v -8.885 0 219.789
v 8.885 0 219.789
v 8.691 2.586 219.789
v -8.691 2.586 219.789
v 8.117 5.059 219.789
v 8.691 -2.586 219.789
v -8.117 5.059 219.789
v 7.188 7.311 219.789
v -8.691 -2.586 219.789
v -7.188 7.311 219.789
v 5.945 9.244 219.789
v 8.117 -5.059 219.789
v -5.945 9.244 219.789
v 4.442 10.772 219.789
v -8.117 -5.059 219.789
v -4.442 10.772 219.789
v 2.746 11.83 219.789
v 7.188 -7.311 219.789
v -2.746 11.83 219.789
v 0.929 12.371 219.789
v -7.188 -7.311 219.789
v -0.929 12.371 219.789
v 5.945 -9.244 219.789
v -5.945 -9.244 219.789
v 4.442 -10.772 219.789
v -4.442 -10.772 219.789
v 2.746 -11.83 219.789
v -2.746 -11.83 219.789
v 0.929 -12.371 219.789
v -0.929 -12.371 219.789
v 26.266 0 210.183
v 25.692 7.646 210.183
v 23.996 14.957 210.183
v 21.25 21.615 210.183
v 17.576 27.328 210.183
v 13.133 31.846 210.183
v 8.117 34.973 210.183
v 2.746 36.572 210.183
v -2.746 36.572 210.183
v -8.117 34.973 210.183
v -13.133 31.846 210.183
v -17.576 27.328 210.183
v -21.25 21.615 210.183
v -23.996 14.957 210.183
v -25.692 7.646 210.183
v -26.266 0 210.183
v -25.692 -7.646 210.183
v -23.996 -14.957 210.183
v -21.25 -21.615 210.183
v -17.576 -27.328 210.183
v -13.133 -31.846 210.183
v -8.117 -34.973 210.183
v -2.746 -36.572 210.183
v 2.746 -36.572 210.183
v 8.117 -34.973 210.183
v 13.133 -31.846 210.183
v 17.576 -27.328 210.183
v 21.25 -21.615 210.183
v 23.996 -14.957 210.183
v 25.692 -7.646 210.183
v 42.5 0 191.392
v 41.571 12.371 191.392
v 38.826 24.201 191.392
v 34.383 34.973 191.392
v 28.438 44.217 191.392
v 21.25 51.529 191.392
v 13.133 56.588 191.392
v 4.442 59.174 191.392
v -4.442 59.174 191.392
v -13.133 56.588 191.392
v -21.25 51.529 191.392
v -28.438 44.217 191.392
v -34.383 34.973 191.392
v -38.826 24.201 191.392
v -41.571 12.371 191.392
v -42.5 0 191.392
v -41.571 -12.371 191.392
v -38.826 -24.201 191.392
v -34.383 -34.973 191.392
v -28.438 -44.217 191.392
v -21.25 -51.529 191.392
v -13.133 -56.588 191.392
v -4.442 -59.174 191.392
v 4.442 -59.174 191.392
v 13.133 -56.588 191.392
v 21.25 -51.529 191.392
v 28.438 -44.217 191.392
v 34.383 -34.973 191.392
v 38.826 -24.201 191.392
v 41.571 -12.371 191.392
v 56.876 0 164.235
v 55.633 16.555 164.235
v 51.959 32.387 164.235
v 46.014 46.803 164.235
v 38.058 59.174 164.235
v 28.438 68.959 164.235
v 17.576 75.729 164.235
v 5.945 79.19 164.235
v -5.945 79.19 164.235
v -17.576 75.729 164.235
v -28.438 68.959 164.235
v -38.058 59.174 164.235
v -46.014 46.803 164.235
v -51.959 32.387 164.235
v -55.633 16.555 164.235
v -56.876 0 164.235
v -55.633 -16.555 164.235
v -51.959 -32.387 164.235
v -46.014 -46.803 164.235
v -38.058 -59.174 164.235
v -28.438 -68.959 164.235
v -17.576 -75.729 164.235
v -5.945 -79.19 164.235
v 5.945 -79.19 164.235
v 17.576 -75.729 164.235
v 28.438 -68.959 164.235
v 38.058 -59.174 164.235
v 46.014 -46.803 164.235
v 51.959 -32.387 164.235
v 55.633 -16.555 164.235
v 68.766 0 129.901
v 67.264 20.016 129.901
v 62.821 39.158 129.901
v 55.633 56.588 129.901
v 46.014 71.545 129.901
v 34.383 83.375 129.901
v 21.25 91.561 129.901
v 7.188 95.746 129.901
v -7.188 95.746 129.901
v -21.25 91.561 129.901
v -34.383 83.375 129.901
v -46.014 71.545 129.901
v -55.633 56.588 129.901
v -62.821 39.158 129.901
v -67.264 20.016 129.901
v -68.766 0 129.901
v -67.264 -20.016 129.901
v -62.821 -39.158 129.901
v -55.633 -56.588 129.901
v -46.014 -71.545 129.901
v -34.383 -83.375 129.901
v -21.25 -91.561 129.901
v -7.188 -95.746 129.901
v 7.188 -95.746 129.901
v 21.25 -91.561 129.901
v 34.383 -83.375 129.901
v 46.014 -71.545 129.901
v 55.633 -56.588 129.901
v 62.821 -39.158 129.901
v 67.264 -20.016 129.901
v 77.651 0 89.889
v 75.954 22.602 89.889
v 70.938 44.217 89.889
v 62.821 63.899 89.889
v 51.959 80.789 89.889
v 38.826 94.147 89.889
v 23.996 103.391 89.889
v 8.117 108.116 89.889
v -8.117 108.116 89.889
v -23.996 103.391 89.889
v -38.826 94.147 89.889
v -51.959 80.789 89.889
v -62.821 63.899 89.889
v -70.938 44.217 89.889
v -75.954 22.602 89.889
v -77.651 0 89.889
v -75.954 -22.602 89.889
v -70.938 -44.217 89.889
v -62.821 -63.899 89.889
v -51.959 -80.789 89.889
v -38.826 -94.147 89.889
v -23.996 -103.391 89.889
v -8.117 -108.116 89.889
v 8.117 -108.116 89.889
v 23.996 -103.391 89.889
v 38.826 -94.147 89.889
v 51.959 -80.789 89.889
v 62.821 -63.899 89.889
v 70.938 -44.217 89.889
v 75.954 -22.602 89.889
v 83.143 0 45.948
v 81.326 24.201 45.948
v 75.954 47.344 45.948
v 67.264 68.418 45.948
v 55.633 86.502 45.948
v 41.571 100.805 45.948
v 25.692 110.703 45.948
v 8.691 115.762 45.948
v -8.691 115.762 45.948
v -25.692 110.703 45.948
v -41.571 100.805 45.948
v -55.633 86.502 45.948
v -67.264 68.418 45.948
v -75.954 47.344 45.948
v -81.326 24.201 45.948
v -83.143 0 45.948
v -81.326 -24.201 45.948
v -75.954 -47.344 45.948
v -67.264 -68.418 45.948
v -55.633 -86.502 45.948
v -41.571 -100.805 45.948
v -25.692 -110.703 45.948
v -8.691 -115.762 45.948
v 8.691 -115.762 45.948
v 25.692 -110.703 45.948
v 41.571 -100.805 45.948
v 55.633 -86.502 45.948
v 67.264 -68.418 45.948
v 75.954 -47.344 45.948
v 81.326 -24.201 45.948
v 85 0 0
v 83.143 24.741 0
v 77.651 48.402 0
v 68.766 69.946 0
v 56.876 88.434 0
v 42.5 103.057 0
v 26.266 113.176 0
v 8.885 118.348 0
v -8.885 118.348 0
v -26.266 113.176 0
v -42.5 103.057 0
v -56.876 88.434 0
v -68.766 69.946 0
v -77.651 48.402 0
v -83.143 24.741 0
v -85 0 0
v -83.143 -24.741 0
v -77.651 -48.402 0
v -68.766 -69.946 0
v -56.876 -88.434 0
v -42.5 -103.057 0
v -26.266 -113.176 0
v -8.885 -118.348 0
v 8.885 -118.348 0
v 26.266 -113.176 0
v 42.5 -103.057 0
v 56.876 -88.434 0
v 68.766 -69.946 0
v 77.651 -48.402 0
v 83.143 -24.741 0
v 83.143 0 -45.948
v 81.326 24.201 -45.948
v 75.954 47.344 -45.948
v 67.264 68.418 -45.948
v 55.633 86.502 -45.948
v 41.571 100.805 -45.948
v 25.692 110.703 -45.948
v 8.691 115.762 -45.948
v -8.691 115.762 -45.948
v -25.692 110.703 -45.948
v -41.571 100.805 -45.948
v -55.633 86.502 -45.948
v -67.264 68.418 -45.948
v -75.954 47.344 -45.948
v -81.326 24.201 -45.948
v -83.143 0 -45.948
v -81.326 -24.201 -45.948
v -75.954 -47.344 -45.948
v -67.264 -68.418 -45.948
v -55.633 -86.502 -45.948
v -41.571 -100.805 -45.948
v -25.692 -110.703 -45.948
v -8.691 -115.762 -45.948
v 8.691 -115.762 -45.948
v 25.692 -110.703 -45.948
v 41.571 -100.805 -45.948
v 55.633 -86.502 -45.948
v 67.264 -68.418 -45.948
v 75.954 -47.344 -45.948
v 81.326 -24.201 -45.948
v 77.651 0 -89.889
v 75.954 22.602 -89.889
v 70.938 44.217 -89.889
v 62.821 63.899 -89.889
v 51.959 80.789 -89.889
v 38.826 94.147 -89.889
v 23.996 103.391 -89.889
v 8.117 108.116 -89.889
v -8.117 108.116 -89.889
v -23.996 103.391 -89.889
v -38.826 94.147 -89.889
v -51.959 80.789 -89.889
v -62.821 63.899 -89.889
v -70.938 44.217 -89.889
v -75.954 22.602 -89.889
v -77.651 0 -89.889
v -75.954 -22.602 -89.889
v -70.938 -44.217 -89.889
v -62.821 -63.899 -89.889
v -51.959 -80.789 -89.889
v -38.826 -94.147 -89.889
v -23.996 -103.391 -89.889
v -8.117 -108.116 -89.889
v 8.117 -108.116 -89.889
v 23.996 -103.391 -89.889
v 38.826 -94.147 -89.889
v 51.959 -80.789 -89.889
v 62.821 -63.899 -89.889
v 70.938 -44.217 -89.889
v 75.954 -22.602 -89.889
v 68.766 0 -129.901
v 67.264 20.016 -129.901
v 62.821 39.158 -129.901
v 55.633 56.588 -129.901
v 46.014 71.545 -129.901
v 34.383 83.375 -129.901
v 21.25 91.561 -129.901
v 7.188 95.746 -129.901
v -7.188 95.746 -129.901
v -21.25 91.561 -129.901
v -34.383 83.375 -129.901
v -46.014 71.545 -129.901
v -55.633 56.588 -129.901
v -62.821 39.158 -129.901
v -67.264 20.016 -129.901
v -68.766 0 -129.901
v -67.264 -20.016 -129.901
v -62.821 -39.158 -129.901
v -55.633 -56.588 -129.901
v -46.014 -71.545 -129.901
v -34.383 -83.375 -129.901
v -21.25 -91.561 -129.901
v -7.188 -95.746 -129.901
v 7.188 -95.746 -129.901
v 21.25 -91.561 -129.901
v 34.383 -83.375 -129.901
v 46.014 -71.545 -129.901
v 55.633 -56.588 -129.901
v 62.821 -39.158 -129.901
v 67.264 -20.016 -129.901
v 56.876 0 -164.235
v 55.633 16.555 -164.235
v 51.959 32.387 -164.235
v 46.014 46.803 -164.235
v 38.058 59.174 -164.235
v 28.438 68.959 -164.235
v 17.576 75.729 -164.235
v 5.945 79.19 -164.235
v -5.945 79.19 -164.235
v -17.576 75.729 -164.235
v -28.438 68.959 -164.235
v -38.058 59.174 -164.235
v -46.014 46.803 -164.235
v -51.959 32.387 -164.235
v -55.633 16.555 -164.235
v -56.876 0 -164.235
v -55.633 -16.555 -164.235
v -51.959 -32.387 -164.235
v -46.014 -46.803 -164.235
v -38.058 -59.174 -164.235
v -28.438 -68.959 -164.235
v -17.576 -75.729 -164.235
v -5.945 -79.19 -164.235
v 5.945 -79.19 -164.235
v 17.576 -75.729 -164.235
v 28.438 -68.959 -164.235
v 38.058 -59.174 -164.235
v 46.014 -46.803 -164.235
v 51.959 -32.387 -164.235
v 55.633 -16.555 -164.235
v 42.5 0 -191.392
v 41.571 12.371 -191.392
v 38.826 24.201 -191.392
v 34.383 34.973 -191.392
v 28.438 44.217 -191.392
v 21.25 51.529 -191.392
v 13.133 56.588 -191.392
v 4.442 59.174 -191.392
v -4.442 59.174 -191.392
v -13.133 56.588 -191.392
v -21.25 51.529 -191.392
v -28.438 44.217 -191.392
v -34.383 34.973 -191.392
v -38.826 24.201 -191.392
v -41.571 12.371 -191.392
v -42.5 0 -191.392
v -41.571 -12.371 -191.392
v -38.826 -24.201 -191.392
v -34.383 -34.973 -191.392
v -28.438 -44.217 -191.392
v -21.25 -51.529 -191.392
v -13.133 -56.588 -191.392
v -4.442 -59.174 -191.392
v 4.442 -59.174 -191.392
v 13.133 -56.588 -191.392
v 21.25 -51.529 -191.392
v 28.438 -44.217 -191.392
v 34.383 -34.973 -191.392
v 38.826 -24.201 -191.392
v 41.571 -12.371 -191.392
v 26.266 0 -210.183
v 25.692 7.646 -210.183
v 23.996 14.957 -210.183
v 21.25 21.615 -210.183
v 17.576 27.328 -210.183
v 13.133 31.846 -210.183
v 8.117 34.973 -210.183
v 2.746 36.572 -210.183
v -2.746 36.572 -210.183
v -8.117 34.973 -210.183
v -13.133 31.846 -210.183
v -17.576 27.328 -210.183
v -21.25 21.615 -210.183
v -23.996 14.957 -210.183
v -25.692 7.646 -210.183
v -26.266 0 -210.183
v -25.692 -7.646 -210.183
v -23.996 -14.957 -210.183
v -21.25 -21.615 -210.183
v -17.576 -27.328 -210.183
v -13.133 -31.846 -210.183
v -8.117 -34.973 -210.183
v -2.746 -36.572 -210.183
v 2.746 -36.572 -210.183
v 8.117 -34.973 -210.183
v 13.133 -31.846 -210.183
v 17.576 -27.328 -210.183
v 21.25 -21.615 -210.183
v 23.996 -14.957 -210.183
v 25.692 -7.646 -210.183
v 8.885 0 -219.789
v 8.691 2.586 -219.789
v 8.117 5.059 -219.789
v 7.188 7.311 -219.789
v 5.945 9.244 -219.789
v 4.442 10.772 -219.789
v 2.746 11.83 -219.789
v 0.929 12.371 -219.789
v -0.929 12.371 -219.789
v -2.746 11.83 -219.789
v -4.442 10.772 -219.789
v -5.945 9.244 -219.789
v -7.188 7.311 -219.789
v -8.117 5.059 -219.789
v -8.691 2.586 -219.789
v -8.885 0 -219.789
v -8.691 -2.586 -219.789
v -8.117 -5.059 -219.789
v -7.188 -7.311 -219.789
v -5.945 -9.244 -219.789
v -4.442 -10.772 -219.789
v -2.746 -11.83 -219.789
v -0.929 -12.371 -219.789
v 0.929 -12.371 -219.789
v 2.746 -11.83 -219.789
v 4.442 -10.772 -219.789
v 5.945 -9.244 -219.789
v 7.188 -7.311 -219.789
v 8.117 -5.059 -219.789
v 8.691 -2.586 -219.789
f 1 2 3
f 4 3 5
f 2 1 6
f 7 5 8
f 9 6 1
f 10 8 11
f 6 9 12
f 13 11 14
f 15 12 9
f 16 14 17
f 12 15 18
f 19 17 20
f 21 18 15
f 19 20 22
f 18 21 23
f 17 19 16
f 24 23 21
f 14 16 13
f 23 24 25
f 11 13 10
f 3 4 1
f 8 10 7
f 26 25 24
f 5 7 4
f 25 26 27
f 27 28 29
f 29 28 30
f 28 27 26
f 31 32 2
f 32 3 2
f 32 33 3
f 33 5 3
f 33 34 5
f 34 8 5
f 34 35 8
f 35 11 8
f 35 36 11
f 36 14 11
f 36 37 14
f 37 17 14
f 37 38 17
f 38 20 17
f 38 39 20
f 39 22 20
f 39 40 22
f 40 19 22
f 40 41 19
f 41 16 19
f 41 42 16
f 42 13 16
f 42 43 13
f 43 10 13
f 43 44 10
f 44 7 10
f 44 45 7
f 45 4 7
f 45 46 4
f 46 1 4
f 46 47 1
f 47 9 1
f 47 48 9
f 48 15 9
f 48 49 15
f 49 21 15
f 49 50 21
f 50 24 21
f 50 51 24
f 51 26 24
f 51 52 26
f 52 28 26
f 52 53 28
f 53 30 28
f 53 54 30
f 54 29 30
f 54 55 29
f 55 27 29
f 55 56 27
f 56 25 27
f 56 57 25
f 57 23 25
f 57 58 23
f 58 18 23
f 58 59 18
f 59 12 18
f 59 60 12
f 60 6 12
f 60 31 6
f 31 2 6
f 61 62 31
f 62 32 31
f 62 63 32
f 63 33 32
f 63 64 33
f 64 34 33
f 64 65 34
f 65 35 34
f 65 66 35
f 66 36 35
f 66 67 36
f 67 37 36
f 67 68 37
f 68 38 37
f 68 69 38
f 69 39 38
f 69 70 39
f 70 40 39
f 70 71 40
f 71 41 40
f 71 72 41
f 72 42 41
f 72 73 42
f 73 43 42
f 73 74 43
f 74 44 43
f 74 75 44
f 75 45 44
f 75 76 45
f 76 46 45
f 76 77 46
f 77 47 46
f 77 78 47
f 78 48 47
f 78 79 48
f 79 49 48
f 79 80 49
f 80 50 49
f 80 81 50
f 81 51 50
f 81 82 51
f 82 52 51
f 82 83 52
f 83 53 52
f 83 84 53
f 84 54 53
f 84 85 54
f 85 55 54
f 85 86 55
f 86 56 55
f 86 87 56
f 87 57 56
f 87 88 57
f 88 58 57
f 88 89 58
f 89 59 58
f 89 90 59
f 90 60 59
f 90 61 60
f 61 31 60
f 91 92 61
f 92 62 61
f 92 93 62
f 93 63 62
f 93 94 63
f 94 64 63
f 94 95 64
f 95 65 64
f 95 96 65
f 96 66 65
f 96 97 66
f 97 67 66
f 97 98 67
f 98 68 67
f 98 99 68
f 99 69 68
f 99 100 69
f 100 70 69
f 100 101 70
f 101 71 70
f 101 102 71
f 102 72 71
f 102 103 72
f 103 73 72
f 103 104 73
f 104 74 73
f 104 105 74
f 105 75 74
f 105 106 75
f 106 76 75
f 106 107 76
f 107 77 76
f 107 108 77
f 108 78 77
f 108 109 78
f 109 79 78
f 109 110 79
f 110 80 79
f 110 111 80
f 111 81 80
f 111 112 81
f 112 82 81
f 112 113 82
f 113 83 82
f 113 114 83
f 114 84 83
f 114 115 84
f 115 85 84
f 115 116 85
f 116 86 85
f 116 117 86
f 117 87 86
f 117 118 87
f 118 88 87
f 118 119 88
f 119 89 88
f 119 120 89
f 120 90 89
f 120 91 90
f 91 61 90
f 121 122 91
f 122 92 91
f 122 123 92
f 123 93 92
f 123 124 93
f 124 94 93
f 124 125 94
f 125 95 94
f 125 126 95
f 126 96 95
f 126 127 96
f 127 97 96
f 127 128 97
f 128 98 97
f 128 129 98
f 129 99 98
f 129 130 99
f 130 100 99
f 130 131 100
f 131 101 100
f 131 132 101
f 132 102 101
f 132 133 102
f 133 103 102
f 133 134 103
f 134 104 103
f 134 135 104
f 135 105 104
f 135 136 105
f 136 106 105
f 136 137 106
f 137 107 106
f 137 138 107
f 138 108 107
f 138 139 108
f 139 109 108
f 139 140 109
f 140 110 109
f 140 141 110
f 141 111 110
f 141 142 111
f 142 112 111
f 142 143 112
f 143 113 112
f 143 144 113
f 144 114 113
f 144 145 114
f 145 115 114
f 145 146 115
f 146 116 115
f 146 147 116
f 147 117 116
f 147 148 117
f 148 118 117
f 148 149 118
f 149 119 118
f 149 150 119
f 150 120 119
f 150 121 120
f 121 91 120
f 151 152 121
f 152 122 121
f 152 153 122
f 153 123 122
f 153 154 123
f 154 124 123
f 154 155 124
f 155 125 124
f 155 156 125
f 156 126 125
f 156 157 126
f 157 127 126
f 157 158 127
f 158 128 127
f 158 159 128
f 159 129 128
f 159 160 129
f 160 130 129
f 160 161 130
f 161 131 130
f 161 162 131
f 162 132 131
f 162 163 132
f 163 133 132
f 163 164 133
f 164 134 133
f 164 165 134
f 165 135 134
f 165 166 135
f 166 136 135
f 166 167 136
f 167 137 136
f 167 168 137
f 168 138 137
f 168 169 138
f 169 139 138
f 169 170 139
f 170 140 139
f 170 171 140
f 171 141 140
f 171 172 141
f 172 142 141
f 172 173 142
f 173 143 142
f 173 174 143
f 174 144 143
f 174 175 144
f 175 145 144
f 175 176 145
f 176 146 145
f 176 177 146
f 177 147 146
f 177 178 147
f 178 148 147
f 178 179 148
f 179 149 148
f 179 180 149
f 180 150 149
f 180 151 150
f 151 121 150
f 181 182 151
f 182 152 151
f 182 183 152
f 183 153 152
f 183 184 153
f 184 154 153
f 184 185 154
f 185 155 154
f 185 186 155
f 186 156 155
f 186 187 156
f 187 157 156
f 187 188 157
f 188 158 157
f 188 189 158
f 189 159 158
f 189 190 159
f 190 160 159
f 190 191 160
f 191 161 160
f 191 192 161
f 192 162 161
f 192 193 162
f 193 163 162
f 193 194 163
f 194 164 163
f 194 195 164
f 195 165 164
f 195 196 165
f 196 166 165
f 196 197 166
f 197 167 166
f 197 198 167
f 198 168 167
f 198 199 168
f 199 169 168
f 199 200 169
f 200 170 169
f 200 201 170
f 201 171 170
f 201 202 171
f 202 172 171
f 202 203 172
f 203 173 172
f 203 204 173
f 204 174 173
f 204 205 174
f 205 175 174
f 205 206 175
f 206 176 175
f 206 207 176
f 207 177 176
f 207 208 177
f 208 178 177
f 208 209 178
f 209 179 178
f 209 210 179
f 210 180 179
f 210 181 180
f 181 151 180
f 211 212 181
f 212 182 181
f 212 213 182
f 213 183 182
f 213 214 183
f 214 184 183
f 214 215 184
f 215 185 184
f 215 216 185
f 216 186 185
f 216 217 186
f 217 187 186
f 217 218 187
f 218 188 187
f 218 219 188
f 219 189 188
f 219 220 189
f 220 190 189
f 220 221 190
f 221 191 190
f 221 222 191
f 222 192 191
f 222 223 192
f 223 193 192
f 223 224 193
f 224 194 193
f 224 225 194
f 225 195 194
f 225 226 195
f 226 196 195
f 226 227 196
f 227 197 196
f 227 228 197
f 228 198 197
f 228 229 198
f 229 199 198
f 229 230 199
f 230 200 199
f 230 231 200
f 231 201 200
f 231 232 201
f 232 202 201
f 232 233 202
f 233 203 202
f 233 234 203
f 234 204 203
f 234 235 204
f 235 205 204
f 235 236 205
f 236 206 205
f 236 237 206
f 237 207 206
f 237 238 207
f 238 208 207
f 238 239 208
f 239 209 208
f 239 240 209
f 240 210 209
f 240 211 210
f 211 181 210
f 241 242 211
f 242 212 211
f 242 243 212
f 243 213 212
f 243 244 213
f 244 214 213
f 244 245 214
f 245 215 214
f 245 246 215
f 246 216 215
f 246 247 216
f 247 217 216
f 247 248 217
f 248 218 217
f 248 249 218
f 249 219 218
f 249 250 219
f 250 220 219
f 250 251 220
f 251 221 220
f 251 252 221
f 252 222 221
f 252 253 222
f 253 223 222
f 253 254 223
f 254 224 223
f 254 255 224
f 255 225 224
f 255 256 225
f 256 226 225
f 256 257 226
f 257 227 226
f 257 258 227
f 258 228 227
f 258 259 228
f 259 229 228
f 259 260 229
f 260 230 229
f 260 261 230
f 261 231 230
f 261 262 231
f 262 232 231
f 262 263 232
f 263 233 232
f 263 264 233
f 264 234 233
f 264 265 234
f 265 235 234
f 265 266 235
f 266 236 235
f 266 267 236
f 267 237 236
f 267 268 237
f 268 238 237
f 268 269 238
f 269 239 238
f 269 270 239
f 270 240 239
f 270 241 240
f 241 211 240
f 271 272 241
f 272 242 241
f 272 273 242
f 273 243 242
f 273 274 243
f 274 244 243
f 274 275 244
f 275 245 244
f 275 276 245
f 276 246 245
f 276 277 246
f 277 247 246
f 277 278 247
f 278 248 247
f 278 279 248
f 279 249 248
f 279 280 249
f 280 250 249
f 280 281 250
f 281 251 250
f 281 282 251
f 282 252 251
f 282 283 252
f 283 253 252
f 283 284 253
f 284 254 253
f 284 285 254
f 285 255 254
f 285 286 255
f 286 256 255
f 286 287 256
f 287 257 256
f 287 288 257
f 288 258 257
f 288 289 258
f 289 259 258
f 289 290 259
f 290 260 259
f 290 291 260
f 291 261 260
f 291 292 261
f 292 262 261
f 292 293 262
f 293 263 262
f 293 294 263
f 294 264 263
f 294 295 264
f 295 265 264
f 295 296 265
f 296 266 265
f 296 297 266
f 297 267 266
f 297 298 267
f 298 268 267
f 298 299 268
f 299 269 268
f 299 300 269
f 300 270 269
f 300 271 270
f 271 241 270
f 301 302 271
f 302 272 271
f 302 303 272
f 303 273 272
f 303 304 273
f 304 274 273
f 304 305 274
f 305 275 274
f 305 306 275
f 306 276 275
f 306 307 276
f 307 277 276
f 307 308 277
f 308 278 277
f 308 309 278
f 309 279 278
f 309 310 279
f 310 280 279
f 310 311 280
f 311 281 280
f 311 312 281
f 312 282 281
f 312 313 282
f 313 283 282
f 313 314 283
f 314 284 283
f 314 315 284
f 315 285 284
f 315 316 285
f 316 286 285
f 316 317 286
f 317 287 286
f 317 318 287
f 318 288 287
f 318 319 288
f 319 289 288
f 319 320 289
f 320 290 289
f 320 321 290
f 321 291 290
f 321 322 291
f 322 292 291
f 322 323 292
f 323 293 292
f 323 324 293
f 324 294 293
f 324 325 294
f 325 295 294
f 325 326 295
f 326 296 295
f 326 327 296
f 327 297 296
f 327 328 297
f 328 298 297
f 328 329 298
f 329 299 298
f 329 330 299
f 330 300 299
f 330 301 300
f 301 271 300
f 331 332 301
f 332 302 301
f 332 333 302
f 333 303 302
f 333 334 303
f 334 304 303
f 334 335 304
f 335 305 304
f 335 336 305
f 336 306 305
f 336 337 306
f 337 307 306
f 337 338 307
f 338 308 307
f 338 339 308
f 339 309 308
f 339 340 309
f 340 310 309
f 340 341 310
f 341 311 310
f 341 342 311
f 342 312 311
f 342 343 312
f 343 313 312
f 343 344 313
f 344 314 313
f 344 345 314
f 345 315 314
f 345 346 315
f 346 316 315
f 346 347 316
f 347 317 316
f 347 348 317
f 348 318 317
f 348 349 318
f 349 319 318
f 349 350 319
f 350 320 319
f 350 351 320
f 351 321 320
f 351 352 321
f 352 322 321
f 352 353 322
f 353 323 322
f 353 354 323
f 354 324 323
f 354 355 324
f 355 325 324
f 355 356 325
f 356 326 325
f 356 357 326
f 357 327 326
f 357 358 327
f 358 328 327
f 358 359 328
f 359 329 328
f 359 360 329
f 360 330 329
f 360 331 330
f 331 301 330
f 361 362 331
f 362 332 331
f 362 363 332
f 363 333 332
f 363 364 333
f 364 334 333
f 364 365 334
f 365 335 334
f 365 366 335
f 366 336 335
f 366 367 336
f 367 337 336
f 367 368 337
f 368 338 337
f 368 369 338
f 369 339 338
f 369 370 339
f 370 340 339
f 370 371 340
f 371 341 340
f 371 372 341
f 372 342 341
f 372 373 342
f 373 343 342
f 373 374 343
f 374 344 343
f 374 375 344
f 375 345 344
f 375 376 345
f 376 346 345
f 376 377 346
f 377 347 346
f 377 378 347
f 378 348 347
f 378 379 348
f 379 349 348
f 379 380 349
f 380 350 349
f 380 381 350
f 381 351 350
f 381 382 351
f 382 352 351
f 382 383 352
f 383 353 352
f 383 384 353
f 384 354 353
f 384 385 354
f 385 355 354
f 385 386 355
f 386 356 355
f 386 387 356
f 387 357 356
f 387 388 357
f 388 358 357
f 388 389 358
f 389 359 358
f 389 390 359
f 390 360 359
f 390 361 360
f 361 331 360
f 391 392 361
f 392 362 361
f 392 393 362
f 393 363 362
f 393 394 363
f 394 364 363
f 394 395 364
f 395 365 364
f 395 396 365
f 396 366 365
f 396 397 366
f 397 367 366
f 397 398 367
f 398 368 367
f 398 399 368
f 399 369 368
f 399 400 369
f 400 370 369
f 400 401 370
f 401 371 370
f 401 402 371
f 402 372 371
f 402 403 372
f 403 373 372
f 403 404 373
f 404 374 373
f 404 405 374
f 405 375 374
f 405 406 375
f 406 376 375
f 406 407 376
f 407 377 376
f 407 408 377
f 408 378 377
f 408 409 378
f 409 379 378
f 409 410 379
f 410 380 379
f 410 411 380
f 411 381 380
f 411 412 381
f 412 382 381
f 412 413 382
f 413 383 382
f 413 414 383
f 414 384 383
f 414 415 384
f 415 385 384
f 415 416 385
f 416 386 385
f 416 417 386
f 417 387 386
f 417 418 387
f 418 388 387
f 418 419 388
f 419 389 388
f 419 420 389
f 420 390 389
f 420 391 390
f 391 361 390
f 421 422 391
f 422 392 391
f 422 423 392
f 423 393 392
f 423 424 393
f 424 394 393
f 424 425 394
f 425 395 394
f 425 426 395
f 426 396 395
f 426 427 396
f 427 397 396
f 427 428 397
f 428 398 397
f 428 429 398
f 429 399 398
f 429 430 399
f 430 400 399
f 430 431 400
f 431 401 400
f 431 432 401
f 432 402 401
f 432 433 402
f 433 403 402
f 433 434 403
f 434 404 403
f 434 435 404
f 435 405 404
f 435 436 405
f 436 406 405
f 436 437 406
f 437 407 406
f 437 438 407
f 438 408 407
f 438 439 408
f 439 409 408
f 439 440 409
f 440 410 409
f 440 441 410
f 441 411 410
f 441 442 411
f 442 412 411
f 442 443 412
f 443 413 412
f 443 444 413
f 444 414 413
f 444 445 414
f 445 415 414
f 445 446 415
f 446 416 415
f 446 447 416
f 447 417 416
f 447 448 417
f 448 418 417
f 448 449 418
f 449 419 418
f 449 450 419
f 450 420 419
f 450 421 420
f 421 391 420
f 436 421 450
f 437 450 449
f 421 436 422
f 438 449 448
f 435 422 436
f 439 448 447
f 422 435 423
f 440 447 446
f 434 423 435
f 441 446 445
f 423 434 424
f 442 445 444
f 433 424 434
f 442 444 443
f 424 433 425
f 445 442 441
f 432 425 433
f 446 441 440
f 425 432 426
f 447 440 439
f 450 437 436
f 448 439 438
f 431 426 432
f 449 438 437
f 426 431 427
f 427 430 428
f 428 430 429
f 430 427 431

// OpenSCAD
// Generated by SolidPython 1.0.1 on 2020-07-29 00:39:26


scale(v = [5, 7, 13]) {
	sphere(r = 17);
}
/***********************************************
*********      SolidPython code:      **********
************************************************
 
# import packages: SolidPython
from solid import *
from solid.utils import *
from itertools import chain, combinations


class Resize:

    def __init__(self, scad_file):
        self.scad_file = scad_file
        #self.scad_file = import_scad(scad_file)
        # cone/cylinder param:
        self.r1 = 0
        self.r2 = 0
        self.h = 0
        # rectangular prism param:
        self.w = 0
        self.l = 0
        # ellipse param:
        self.r = 0

    # import OpenScad code (file name corresponds to shape)


    # classify shape + parameters
    def assign(self, param1, param2, param3):
        if self.scad_file == 'cone.scad':
            self.r1 = param1
            self.r2 = param2
            self.h = param3
        elif self.scad_file == 'cylinder.scad':
            self.r1 = param1
            self.r2 = param2
            self.h = param3
        elif self.scad_file == 'rectangularPrism.scad':
            self.h = param1
            self.l = param2
            self.w = param3
        else:
            self.r = param1
            self.h = param2

    # resize parameters
    def iterate(self):
        x = range(3, 20, 2)
        i = 1
        if self.scad_file == 'cone.scad':
            tempList = list(combinations(x, 2))
            for temp in tempList:
                param1 = temp[0]
                param2 = temp[1]
                filepath = 'produced_scad_files/' + 'cone' + str(param1) + '_' + str(param2) + '_' + '.scad'
                scad_render_to_file(cylinder(h=param1, r1=param2, r2=0), filepath)

        elif self.scad_file == 'cylinder.scad':
            tempList = list(combinations(x, 3))
            for temp in tempList:
                param1 = temp[0]
                param2 = temp[1]
                filepath = 'produced_scad_files/' + 'cylinder' + str(param1) + '_' + str(param2) + '_' + '.scad'
                scad_render_to_file(cylinder(h=param1, r1=param2, r2=param2), filepath)

        elif self.scad_file == 'rectangularPrism.scad':
            tempList = list(combinations(x, 3))
            for temp in tempList:
                param1 = temp[0]
                param2 = temp[1]
                param3 = temp[2]
                filepath = 'produced_scad_files/' + 'rectangularPrism' + str(param1) + '_' + str(param2) + '_' + str(
                    param3) + '.scad'
                scad_render_to_file(cube(size=(param1, param2, param3)), filepath)

        elif self.scad_file == 'ellipse.scad':
            tempList = list(combinations(x, 4))
            for temp in tempList:
                param1 = temp[0]
                param2 = temp[1]
                param3 = temp[2]
                param4 = temp[3]
                filepath = 'produced_scad_files/' + 'ellipse' + str(param1) + '_' + str(param2) + '_' + str(param3) + '_' + str(param4) + '.scad'
                scad_render_to_file(scale([param1, param2, param3])(sphere(r=param4)), filepath)

    def render_to_scadfile(self):
        scad_render_to_file(scad, 'example.scad') 
 
************************************************/
